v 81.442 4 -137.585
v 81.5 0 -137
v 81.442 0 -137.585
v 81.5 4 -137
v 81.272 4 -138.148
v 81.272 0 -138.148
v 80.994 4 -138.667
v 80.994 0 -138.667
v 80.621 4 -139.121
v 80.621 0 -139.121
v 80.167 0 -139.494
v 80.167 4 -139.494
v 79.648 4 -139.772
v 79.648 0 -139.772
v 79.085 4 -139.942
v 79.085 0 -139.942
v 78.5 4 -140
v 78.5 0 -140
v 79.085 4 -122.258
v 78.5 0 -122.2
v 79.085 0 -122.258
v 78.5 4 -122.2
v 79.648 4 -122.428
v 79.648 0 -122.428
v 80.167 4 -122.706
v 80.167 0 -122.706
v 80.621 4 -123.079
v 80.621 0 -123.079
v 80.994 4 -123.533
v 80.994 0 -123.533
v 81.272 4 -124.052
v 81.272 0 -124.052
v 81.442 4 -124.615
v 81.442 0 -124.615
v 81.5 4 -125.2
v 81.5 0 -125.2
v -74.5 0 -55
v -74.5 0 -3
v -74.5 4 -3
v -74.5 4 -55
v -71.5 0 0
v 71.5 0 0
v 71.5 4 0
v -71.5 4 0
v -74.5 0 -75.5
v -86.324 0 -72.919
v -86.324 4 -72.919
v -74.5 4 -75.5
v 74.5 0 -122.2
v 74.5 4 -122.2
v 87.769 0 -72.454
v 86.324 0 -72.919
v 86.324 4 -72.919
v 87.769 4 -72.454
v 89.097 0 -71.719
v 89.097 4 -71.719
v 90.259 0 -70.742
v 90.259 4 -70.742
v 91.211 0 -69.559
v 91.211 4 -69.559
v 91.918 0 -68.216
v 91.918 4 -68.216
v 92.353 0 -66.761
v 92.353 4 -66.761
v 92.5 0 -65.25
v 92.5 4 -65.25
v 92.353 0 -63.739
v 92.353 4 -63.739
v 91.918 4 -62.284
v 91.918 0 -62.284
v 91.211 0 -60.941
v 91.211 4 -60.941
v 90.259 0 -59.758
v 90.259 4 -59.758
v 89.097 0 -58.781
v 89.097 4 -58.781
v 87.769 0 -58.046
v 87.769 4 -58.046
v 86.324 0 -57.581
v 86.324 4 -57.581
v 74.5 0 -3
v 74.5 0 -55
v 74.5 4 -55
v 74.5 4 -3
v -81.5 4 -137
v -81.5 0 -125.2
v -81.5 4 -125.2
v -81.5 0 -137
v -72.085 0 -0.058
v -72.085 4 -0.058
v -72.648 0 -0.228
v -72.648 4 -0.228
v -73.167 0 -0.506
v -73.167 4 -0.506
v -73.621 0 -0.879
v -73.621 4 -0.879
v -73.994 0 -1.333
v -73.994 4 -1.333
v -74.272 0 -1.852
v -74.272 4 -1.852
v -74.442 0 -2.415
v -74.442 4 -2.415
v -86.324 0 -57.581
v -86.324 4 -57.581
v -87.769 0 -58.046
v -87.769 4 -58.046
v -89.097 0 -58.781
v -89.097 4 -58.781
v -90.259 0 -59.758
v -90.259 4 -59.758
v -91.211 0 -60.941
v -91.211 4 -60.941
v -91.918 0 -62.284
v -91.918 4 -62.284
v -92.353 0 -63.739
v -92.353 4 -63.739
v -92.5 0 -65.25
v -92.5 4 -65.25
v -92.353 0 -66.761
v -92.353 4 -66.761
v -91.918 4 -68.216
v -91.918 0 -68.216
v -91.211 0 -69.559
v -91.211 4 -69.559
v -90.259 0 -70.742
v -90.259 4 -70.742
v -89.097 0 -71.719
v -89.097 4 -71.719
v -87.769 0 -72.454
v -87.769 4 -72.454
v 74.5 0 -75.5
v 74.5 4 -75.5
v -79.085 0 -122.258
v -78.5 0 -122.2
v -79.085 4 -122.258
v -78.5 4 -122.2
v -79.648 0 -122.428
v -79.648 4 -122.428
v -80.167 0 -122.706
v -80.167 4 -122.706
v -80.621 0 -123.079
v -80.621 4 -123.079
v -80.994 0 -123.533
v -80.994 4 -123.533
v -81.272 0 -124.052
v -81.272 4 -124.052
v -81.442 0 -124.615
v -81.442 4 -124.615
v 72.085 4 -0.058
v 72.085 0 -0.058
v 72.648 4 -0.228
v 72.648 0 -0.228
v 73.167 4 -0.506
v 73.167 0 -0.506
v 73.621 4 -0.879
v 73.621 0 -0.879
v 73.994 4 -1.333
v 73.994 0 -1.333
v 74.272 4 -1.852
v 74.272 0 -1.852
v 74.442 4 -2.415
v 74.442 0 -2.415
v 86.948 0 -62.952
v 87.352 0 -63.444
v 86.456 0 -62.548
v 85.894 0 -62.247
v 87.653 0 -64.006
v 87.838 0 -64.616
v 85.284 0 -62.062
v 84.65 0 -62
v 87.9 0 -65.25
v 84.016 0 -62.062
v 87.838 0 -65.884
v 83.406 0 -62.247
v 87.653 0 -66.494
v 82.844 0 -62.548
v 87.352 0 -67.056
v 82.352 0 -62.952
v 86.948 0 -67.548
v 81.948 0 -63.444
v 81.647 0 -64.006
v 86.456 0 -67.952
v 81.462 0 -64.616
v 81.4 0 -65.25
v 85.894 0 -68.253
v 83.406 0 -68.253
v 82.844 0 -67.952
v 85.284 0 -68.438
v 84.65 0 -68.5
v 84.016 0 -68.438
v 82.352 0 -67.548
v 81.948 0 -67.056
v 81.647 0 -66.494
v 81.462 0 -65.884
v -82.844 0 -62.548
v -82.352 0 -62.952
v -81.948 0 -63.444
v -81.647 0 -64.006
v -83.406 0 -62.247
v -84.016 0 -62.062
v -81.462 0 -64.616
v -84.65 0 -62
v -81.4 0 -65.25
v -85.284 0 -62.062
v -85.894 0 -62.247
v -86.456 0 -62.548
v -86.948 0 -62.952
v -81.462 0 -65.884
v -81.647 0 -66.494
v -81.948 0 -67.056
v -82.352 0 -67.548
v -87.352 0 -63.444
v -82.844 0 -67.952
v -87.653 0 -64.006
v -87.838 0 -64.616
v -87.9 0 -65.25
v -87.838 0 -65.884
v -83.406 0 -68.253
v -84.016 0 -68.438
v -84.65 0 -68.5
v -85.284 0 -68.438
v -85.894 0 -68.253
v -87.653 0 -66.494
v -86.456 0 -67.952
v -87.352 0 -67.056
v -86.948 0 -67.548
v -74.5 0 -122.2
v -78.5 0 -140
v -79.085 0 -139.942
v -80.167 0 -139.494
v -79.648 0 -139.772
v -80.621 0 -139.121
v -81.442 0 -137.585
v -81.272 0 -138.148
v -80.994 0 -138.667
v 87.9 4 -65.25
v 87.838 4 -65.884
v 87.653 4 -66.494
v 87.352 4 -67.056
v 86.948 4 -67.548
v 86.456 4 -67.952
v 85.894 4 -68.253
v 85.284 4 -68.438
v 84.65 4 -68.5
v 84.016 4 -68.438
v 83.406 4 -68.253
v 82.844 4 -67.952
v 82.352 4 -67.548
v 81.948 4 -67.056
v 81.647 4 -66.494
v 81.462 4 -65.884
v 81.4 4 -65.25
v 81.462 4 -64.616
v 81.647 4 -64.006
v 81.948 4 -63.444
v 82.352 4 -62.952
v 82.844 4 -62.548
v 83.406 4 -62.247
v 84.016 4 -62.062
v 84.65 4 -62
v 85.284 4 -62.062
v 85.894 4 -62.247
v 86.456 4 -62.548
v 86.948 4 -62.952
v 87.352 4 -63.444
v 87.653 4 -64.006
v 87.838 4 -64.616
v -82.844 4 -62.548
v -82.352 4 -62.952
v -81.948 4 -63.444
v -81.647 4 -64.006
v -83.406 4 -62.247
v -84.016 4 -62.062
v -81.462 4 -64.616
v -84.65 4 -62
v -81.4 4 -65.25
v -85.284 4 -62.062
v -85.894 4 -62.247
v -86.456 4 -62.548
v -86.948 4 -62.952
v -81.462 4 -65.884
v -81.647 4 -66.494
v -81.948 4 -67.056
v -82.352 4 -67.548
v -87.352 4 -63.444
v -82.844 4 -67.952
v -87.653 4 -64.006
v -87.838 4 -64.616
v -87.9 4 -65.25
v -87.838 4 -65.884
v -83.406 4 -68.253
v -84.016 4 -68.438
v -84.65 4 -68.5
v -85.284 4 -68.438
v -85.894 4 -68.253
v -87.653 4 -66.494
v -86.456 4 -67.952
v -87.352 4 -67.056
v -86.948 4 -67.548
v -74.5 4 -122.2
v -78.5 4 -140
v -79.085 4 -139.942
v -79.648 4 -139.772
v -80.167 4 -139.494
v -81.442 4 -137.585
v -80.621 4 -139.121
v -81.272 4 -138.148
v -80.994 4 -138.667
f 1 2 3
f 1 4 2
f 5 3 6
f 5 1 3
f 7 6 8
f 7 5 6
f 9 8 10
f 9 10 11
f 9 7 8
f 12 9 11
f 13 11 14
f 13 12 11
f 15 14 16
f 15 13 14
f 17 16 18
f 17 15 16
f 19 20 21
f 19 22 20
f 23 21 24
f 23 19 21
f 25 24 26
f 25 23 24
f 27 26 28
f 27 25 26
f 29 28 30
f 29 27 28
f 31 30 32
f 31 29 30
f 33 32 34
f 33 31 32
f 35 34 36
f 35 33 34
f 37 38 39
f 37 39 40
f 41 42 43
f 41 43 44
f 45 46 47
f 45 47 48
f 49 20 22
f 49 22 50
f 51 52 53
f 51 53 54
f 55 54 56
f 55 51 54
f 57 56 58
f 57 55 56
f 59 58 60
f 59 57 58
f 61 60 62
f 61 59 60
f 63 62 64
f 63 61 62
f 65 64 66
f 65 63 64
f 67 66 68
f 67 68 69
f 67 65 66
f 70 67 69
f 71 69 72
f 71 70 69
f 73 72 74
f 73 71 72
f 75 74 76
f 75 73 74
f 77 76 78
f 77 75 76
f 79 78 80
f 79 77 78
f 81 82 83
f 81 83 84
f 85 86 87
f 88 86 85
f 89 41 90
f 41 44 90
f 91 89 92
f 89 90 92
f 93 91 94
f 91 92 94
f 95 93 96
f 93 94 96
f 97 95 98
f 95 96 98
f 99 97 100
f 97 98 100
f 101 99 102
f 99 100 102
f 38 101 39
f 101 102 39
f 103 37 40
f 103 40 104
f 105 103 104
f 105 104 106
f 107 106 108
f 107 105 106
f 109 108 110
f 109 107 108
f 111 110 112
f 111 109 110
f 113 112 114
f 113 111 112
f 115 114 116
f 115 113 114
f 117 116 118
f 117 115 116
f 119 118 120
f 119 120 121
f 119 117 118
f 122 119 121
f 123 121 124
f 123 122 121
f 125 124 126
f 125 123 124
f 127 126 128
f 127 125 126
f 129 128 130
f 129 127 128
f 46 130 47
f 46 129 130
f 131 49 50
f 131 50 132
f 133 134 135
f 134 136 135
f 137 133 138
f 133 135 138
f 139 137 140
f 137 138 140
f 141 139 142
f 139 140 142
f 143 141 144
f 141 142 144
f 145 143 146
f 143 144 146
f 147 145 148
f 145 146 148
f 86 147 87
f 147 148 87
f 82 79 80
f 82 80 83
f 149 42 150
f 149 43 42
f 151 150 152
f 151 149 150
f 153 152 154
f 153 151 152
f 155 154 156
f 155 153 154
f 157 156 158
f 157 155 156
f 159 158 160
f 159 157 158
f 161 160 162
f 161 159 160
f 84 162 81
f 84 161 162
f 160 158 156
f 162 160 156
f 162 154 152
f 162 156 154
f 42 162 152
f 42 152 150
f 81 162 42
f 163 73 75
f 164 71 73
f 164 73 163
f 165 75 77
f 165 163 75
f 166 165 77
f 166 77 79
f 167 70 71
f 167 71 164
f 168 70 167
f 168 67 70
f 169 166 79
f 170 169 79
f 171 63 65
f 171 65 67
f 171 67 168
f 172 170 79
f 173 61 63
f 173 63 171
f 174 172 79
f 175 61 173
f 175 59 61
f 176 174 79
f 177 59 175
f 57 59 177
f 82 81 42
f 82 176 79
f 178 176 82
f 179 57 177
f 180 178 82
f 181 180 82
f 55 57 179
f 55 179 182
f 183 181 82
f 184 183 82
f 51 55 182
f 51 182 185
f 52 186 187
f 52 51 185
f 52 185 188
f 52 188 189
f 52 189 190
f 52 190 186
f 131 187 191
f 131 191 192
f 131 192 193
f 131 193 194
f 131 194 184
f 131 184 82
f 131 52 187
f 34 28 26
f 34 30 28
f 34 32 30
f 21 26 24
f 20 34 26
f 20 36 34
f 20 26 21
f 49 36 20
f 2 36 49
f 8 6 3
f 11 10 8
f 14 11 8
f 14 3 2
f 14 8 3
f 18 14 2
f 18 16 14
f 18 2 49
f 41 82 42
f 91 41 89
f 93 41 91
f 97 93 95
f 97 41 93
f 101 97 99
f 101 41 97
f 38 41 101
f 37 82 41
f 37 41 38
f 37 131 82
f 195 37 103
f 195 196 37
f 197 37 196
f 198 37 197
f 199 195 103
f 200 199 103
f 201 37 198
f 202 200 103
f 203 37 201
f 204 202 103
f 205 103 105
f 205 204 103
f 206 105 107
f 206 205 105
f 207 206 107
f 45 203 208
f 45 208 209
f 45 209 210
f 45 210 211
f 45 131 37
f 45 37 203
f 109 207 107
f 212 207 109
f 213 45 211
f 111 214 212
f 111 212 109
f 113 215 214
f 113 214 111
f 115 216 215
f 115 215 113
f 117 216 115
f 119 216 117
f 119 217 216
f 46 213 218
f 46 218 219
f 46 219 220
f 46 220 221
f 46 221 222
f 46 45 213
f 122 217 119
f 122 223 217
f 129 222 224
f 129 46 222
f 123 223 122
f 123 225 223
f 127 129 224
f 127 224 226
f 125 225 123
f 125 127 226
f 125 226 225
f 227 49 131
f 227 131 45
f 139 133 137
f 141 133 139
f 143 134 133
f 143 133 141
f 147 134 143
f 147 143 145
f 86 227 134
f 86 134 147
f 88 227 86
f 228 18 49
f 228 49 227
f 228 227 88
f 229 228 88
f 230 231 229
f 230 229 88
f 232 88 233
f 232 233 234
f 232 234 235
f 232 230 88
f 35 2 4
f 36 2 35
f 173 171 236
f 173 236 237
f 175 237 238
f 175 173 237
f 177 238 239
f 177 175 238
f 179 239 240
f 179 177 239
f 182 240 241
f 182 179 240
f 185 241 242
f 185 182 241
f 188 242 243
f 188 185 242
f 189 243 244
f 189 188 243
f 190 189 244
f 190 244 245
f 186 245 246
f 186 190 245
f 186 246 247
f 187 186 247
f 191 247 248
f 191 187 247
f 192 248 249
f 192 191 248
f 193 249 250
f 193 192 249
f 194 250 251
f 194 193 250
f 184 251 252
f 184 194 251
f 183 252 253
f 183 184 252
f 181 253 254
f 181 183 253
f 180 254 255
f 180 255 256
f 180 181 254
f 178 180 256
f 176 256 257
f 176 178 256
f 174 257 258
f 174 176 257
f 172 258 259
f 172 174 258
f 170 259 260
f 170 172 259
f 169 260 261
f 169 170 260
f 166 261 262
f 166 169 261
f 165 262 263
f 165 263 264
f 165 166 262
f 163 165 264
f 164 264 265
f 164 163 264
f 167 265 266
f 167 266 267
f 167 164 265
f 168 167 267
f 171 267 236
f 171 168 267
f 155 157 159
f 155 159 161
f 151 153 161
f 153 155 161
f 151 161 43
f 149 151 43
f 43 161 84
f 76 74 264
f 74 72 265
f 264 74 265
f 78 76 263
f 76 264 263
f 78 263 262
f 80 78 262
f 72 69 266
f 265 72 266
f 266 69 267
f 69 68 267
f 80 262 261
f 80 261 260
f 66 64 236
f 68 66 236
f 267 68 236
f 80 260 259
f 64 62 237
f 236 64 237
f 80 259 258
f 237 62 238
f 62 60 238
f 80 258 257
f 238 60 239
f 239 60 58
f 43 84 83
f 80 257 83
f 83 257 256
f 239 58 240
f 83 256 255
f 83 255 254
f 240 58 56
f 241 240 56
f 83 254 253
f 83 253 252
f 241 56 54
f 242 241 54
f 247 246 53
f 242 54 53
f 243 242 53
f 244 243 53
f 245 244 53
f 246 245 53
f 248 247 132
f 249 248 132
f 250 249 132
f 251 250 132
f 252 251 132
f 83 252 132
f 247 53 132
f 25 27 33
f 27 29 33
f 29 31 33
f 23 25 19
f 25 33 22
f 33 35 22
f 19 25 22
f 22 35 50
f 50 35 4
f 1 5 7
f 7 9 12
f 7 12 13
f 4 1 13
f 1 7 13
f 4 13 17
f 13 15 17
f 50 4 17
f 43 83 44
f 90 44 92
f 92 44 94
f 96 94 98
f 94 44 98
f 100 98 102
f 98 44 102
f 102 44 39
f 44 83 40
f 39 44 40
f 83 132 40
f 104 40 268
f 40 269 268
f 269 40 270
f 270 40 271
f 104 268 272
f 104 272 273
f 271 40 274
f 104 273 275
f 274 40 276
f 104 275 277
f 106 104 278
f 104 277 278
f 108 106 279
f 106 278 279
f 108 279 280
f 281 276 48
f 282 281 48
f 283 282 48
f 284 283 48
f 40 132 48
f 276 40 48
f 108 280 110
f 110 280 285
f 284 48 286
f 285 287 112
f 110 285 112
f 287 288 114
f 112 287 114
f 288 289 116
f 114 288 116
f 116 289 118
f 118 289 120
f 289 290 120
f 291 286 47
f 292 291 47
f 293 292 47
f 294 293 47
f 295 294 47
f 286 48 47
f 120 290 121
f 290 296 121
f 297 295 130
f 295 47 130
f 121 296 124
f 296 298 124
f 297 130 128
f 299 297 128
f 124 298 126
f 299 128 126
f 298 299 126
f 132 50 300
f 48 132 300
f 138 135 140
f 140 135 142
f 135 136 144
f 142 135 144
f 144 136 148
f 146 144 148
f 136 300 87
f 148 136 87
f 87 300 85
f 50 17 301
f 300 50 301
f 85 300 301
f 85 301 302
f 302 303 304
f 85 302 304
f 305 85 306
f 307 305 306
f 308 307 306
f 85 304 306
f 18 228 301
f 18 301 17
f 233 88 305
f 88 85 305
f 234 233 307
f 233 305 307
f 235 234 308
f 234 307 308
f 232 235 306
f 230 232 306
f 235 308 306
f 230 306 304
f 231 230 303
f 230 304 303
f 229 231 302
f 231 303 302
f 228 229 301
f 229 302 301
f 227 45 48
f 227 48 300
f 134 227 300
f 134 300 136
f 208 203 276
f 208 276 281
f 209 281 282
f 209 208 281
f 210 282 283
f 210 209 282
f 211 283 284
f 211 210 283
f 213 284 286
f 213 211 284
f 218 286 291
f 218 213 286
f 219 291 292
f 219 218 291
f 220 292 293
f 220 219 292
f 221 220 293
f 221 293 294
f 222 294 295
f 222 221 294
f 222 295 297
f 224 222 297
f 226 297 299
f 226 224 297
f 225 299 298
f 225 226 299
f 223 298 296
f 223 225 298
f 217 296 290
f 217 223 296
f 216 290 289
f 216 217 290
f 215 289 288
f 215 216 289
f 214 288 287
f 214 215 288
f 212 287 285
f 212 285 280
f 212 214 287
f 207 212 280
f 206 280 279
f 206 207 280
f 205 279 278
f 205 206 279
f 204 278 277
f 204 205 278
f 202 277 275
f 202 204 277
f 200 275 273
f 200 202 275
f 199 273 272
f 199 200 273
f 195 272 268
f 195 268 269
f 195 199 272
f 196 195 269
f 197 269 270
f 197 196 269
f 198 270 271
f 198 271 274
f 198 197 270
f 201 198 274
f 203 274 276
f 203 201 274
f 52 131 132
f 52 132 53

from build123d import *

# Parameters (mm, degrees)
SKETCH1_R           = 3.25
BOSS_EXTRUDE1_DEPTH = 4
FILLET7_R           = 3


with BuildPart() as part:
    # Sketch1 → Boss-Extrude1 (new body)
    with BuildSketch(Plane(origin=(0, 0, 0), x_dir=(1, 0, 0), z_dir=(0, 1, 0))):
        with BuildLine():
            Line((74.5, 0), (-74.5, 0))
            Line((-74.5, 0), (-74.5, 55))
            Line((-74.5, 55), (-86.323846824, 57.580532169))
            ThreePointArc((-86.323846824, 57.580532169), (-92.5, 65.25), (-86.323846824, 72.919467831))
            Line((-86.323846824, 72.919467831), (-74.5, 75.5))
            Line((-74.5, 75.5), (-74.5, 122.2))
            Line((-74.5, 122.2), (-81.5, 122.2))
            Line((-81.5, 122.2), (-81.5, 140))
            Line((-81.5, 140), (81.5, 140))
            Line((81.5, 140), (81.5, 122.2))
            Line((81.5, 122.2), (74.5, 122.2))
            Line((74.5, 122.2), (74.5, 75.5))
            Line((74.5, 75.5), (86.323846824, 72.919467831))
            ThreePointArc((86.323846824, 72.919467831), (92.5, 65.25), (86.323846824, 57.580532169))
            Line((86.323846824, 57.580532169), (74.5, 55))
            Line((74.5, 55), (74.5, 0))
        make_face()
        with Locations((-84.65, 65.25)):
            Circle(SKETCH1_R, mode=Mode.SUBTRACT)
        with Locations((84.65, 65.25)):
            Circle(SKETCH1_R, mode=Mode.SUBTRACT)
    extrude(amount=BOSS_EXTRUDE1_DEPTH)

    # Fillet7
    fillet7_edges = [part.edges().sort_by_distance(p)[0] for p in [
        (74.5, 2, 0),
        (-74.5, 2, 0),
        (-81.5, 2, -122.2),
        (-81.5, 2, -140),
        (81.5, 2, -140),
        (81.5, 2, -122.2),
    ]]
    fillet(fillet7_edges, radius=FILLET7_R)


solid = part.part
